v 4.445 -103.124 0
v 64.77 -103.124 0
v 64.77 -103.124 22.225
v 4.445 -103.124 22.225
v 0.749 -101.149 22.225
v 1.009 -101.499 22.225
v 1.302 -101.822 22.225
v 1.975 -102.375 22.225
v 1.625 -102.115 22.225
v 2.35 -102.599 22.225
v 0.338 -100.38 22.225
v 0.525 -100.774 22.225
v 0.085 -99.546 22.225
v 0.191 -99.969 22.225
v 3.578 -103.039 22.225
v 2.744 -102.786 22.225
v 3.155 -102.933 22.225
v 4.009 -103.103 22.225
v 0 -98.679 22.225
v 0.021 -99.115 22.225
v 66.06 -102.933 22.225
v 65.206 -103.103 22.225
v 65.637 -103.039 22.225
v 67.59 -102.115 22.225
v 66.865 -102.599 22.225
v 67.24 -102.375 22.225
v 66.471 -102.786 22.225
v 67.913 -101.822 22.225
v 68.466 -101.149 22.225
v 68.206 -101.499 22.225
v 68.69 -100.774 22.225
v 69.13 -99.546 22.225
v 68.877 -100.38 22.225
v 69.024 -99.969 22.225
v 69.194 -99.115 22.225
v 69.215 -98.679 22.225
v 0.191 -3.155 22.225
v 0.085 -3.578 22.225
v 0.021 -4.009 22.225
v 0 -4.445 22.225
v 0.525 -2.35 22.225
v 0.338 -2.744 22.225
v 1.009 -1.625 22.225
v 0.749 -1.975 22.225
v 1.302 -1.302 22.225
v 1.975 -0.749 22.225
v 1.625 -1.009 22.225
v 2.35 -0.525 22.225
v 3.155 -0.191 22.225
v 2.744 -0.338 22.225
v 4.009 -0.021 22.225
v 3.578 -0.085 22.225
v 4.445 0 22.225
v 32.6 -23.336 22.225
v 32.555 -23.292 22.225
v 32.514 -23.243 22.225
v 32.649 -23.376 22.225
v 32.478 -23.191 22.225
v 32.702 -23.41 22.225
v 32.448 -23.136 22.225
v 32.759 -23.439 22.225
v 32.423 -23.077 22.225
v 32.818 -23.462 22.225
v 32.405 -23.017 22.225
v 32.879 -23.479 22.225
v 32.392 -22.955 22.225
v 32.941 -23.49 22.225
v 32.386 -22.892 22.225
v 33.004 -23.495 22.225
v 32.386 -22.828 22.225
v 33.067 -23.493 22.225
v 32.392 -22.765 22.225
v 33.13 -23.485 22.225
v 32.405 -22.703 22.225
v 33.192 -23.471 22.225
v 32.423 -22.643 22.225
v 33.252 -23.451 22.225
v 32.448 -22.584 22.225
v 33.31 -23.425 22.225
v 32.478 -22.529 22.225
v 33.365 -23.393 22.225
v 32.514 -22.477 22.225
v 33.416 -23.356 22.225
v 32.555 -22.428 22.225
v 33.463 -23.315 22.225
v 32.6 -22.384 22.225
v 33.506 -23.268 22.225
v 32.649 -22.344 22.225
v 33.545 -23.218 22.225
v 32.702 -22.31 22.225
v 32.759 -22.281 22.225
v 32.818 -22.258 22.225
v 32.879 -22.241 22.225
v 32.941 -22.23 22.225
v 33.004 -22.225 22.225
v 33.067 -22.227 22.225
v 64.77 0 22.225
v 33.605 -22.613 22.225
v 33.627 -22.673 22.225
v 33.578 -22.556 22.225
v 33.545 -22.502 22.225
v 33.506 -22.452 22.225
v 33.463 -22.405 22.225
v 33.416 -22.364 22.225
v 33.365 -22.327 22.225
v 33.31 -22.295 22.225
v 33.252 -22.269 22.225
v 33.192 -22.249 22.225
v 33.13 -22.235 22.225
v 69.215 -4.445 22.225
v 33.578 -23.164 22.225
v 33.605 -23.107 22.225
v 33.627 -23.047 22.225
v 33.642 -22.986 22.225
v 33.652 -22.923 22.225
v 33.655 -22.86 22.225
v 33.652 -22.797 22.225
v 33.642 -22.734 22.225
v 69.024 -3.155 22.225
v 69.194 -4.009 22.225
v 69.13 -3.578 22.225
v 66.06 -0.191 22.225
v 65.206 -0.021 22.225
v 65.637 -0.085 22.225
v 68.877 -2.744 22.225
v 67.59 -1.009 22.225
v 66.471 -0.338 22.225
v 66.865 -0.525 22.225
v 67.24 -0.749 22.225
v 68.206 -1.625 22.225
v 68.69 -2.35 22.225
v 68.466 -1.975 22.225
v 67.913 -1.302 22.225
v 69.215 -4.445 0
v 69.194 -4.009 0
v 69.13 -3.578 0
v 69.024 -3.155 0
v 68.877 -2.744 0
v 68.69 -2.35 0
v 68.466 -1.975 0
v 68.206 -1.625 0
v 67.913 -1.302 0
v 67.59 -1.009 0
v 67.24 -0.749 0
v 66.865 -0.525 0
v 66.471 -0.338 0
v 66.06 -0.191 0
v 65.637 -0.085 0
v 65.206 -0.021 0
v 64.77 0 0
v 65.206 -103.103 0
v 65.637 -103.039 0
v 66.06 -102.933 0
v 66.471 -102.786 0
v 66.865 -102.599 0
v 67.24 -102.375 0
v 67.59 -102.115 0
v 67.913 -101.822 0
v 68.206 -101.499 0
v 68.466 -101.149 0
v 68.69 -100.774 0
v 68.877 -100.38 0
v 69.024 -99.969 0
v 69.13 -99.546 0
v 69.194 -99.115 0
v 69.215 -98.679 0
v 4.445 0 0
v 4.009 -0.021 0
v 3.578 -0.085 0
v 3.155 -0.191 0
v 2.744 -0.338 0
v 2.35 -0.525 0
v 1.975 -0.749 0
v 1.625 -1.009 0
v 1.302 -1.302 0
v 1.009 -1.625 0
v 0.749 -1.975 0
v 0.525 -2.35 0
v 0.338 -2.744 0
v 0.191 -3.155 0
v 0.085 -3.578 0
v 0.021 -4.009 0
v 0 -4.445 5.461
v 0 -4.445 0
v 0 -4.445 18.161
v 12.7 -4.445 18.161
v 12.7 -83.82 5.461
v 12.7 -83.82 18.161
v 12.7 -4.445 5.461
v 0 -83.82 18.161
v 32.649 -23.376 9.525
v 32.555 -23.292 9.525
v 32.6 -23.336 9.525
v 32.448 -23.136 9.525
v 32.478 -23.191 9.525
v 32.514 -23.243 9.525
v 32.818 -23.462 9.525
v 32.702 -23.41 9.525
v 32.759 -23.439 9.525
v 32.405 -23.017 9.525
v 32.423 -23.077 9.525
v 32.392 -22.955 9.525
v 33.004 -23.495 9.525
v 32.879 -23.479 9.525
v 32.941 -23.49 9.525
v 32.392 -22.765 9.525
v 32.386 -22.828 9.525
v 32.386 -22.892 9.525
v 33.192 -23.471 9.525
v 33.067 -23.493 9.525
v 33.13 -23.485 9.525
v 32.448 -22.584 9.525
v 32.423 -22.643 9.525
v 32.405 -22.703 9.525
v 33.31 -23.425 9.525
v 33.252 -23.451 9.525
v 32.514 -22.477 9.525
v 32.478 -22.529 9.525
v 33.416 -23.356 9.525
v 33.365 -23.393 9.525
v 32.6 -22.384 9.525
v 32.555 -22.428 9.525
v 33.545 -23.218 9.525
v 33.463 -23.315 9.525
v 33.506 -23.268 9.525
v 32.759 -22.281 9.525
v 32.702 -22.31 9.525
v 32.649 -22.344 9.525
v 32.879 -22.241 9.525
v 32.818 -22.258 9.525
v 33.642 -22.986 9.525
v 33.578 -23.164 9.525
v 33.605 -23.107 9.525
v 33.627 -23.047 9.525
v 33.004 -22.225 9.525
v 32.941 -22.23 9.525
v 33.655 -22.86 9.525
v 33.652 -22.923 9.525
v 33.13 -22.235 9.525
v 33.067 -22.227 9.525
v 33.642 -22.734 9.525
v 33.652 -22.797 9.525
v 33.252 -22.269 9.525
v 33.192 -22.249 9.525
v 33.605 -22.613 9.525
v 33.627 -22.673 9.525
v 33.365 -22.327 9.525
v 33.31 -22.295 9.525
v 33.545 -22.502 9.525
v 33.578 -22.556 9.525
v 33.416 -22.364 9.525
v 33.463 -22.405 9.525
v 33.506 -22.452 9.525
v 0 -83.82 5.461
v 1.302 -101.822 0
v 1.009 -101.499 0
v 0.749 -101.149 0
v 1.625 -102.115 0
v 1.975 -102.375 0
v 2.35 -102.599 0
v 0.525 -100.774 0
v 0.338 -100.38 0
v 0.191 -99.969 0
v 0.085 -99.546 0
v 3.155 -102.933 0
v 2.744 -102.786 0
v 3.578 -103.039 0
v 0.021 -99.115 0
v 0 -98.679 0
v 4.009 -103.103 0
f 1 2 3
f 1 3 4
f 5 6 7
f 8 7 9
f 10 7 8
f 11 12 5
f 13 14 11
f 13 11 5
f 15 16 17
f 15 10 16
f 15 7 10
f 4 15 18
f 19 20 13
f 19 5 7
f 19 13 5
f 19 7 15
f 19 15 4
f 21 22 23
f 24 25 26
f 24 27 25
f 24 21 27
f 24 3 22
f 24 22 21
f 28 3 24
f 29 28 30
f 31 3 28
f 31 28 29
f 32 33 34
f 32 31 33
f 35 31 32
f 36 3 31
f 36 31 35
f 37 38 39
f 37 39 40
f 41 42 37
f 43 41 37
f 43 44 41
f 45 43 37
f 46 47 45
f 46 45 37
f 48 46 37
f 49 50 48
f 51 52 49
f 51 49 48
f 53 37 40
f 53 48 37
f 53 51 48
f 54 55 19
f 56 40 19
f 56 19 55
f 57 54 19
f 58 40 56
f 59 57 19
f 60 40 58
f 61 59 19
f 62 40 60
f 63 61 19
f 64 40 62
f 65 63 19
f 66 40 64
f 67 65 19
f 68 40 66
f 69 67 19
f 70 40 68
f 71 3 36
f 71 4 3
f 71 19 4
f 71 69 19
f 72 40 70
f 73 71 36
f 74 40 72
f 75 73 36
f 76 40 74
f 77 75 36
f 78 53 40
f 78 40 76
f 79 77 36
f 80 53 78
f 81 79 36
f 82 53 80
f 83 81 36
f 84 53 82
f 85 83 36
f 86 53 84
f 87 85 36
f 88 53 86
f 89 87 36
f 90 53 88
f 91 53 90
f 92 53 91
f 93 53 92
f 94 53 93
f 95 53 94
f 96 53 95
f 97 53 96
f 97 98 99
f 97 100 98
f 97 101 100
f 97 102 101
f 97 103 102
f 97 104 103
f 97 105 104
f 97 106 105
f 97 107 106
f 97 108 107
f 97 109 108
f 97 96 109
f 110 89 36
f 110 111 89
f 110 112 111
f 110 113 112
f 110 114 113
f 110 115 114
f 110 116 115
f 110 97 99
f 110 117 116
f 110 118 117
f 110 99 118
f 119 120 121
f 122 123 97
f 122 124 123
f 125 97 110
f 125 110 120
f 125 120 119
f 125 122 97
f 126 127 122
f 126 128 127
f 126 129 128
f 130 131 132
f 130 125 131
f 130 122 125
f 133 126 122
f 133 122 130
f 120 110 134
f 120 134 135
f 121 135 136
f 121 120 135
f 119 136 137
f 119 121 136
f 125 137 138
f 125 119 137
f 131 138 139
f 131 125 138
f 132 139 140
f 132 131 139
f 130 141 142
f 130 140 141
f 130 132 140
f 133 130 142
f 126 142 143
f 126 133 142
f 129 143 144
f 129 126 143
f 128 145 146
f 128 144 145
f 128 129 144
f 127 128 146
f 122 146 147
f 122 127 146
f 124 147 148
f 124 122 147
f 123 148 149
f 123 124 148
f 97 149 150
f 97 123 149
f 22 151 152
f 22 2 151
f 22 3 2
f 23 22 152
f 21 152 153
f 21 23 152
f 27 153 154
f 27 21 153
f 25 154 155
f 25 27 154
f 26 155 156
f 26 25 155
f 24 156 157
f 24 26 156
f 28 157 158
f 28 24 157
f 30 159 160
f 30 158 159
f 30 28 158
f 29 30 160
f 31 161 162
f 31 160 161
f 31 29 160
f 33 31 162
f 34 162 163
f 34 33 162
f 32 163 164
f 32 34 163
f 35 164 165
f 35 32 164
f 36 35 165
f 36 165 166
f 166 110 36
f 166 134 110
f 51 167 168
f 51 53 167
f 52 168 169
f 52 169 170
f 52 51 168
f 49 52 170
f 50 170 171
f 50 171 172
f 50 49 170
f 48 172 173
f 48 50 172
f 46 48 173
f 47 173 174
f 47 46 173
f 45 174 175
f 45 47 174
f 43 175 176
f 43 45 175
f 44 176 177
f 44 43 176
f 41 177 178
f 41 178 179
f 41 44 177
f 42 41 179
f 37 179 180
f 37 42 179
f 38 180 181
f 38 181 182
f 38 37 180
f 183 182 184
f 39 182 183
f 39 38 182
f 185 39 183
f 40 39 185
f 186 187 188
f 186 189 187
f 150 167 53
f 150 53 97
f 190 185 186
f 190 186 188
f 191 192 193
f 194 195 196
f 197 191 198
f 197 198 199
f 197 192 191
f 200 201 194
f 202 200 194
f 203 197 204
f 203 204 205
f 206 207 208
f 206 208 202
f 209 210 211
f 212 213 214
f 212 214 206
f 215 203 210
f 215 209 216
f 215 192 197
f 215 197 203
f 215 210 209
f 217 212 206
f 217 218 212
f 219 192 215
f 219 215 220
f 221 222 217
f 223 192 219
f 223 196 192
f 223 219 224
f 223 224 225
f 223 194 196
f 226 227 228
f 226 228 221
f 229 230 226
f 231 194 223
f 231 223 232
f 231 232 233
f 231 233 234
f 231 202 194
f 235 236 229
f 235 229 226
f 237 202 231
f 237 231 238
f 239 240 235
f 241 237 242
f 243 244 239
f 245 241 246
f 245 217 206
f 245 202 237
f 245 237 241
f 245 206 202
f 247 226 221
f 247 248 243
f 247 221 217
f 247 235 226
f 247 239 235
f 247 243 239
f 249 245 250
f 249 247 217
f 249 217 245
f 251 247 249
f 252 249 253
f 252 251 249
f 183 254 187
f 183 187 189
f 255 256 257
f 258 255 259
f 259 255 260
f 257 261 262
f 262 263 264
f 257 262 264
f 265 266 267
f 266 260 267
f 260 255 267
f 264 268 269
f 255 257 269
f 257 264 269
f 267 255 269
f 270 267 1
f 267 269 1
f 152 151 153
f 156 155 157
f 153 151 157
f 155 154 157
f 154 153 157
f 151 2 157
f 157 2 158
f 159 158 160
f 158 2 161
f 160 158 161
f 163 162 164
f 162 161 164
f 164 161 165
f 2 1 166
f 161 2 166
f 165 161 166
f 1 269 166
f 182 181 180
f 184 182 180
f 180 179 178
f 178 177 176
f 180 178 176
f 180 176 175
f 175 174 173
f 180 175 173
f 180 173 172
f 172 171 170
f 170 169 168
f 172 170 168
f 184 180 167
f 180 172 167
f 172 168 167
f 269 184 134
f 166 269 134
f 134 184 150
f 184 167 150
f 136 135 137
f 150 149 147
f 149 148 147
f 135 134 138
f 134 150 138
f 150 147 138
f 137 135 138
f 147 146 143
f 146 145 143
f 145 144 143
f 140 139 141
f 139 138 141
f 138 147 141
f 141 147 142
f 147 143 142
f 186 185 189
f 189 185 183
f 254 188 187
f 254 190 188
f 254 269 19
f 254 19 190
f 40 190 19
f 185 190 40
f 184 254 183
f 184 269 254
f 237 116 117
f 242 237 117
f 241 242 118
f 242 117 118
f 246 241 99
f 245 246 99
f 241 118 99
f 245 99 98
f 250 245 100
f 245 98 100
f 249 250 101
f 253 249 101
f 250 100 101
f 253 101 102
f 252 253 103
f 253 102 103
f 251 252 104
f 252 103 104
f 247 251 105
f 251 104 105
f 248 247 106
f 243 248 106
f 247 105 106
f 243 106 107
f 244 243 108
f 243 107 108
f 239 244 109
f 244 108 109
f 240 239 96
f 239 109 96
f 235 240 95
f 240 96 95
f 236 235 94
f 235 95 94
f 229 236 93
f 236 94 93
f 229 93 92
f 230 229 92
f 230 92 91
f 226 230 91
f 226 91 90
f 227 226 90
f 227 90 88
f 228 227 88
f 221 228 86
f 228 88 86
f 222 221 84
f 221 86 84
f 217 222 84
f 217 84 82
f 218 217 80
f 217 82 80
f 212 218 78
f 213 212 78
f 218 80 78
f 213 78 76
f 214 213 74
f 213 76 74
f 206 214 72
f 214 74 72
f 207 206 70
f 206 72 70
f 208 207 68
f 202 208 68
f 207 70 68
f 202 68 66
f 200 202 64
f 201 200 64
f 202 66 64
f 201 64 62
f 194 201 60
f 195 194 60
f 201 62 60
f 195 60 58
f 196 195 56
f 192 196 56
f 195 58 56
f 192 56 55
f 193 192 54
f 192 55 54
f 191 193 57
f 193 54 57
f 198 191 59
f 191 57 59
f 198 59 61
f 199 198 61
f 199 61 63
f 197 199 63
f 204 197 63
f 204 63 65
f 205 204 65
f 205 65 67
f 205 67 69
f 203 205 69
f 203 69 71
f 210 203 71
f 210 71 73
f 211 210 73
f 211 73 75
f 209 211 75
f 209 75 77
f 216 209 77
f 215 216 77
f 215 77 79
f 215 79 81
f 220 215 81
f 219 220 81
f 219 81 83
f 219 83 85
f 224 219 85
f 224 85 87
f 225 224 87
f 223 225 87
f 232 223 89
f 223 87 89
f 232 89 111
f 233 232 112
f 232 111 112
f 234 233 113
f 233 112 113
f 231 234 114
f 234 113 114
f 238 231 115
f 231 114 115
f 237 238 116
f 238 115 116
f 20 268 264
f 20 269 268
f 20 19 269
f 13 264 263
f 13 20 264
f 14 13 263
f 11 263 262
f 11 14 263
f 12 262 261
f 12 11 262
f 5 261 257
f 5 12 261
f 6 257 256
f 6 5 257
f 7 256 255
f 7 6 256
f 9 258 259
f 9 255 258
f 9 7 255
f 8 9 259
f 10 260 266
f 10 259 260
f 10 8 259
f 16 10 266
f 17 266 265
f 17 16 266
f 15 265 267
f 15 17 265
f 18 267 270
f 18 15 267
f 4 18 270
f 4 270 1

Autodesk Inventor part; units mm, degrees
ref_plane "YZ Plane" through (0, 0, 0) normal (1, 0, 0) x (0, 1, 0)
ref_plane "XZ Plane" through (0, 0, 0) normal (0, 1, 0) x (-1, 0, 0)
ref_plane "XY Plane" through (0, 0, 0) normal (0, 0, 1) x (1, 0, 0)
sketch "Sketch1" plane through (0, 0, 0) normal (0, 0, 1) x (1, 0, 0)
  line L0 (0, 0) -> (69.215, 0)
  line L1 (69.215, 0) -> (69.215, -103.124)
  line L2 (69.215, -103.124) -> (0, -103.124)
  line L3 (0, -103.124) -> (0, 0)
  dimension "d0" = 69.215
  dimension "d1" = 103.124
extrude "Extrusion1" add sketch "Sketch1" along normal blind 22.225
fillet "Fillet1" radius 4.445 3 edges at (0, 0, 11.1125) (69.215, 0, 11.1125) (0, -103.124, 11.1125)
fillet "Fillet2" radius 4.445 1 edges at (69.215, -103.124, 11.1125)
sketch "Sketch2" plane through (0, -98.679, 0) normal (-1, 0, 0) x (0, 0, 1)
  line L0 (0, 0) -> (0, 94.234) projected
  line L1 (22.225, 94.234) -> (0, 94.234) projected
  line L2 (0, 98.679) -> (22.225, 98.679) projected
  line L3 (5.461, 94.234) -> (18.161, 94.234)
  line L4 (18.161, 94.234) -> (18.161, 14.859)
  line L5 (18.161, 14.859) -> (5.461, 14.859)
  line L6 (5.461, 14.859) -> (5.461, 94.234)
  dimension "d8" = 12.7
  dimension "d9" = 79.375
extrude "Extrusion2" cut sketch "Sketch2" against normal blind 12.7
sketch "Sketch3" plane through (0, 0, 22.225) normal (0, 0, 1) x (1, 0, 0)
  line L0 (64.77, 0) -> (4.445, 0) projected
  circle A0 centre (33.02, -22.86) radius 0.635
  point P0 (0, 0)
extrude "Extrusion3" cut sketch "Sketch3" against normal blind 12.7
properties part number "Ethernet switch" material "Acetal Resin, White"
